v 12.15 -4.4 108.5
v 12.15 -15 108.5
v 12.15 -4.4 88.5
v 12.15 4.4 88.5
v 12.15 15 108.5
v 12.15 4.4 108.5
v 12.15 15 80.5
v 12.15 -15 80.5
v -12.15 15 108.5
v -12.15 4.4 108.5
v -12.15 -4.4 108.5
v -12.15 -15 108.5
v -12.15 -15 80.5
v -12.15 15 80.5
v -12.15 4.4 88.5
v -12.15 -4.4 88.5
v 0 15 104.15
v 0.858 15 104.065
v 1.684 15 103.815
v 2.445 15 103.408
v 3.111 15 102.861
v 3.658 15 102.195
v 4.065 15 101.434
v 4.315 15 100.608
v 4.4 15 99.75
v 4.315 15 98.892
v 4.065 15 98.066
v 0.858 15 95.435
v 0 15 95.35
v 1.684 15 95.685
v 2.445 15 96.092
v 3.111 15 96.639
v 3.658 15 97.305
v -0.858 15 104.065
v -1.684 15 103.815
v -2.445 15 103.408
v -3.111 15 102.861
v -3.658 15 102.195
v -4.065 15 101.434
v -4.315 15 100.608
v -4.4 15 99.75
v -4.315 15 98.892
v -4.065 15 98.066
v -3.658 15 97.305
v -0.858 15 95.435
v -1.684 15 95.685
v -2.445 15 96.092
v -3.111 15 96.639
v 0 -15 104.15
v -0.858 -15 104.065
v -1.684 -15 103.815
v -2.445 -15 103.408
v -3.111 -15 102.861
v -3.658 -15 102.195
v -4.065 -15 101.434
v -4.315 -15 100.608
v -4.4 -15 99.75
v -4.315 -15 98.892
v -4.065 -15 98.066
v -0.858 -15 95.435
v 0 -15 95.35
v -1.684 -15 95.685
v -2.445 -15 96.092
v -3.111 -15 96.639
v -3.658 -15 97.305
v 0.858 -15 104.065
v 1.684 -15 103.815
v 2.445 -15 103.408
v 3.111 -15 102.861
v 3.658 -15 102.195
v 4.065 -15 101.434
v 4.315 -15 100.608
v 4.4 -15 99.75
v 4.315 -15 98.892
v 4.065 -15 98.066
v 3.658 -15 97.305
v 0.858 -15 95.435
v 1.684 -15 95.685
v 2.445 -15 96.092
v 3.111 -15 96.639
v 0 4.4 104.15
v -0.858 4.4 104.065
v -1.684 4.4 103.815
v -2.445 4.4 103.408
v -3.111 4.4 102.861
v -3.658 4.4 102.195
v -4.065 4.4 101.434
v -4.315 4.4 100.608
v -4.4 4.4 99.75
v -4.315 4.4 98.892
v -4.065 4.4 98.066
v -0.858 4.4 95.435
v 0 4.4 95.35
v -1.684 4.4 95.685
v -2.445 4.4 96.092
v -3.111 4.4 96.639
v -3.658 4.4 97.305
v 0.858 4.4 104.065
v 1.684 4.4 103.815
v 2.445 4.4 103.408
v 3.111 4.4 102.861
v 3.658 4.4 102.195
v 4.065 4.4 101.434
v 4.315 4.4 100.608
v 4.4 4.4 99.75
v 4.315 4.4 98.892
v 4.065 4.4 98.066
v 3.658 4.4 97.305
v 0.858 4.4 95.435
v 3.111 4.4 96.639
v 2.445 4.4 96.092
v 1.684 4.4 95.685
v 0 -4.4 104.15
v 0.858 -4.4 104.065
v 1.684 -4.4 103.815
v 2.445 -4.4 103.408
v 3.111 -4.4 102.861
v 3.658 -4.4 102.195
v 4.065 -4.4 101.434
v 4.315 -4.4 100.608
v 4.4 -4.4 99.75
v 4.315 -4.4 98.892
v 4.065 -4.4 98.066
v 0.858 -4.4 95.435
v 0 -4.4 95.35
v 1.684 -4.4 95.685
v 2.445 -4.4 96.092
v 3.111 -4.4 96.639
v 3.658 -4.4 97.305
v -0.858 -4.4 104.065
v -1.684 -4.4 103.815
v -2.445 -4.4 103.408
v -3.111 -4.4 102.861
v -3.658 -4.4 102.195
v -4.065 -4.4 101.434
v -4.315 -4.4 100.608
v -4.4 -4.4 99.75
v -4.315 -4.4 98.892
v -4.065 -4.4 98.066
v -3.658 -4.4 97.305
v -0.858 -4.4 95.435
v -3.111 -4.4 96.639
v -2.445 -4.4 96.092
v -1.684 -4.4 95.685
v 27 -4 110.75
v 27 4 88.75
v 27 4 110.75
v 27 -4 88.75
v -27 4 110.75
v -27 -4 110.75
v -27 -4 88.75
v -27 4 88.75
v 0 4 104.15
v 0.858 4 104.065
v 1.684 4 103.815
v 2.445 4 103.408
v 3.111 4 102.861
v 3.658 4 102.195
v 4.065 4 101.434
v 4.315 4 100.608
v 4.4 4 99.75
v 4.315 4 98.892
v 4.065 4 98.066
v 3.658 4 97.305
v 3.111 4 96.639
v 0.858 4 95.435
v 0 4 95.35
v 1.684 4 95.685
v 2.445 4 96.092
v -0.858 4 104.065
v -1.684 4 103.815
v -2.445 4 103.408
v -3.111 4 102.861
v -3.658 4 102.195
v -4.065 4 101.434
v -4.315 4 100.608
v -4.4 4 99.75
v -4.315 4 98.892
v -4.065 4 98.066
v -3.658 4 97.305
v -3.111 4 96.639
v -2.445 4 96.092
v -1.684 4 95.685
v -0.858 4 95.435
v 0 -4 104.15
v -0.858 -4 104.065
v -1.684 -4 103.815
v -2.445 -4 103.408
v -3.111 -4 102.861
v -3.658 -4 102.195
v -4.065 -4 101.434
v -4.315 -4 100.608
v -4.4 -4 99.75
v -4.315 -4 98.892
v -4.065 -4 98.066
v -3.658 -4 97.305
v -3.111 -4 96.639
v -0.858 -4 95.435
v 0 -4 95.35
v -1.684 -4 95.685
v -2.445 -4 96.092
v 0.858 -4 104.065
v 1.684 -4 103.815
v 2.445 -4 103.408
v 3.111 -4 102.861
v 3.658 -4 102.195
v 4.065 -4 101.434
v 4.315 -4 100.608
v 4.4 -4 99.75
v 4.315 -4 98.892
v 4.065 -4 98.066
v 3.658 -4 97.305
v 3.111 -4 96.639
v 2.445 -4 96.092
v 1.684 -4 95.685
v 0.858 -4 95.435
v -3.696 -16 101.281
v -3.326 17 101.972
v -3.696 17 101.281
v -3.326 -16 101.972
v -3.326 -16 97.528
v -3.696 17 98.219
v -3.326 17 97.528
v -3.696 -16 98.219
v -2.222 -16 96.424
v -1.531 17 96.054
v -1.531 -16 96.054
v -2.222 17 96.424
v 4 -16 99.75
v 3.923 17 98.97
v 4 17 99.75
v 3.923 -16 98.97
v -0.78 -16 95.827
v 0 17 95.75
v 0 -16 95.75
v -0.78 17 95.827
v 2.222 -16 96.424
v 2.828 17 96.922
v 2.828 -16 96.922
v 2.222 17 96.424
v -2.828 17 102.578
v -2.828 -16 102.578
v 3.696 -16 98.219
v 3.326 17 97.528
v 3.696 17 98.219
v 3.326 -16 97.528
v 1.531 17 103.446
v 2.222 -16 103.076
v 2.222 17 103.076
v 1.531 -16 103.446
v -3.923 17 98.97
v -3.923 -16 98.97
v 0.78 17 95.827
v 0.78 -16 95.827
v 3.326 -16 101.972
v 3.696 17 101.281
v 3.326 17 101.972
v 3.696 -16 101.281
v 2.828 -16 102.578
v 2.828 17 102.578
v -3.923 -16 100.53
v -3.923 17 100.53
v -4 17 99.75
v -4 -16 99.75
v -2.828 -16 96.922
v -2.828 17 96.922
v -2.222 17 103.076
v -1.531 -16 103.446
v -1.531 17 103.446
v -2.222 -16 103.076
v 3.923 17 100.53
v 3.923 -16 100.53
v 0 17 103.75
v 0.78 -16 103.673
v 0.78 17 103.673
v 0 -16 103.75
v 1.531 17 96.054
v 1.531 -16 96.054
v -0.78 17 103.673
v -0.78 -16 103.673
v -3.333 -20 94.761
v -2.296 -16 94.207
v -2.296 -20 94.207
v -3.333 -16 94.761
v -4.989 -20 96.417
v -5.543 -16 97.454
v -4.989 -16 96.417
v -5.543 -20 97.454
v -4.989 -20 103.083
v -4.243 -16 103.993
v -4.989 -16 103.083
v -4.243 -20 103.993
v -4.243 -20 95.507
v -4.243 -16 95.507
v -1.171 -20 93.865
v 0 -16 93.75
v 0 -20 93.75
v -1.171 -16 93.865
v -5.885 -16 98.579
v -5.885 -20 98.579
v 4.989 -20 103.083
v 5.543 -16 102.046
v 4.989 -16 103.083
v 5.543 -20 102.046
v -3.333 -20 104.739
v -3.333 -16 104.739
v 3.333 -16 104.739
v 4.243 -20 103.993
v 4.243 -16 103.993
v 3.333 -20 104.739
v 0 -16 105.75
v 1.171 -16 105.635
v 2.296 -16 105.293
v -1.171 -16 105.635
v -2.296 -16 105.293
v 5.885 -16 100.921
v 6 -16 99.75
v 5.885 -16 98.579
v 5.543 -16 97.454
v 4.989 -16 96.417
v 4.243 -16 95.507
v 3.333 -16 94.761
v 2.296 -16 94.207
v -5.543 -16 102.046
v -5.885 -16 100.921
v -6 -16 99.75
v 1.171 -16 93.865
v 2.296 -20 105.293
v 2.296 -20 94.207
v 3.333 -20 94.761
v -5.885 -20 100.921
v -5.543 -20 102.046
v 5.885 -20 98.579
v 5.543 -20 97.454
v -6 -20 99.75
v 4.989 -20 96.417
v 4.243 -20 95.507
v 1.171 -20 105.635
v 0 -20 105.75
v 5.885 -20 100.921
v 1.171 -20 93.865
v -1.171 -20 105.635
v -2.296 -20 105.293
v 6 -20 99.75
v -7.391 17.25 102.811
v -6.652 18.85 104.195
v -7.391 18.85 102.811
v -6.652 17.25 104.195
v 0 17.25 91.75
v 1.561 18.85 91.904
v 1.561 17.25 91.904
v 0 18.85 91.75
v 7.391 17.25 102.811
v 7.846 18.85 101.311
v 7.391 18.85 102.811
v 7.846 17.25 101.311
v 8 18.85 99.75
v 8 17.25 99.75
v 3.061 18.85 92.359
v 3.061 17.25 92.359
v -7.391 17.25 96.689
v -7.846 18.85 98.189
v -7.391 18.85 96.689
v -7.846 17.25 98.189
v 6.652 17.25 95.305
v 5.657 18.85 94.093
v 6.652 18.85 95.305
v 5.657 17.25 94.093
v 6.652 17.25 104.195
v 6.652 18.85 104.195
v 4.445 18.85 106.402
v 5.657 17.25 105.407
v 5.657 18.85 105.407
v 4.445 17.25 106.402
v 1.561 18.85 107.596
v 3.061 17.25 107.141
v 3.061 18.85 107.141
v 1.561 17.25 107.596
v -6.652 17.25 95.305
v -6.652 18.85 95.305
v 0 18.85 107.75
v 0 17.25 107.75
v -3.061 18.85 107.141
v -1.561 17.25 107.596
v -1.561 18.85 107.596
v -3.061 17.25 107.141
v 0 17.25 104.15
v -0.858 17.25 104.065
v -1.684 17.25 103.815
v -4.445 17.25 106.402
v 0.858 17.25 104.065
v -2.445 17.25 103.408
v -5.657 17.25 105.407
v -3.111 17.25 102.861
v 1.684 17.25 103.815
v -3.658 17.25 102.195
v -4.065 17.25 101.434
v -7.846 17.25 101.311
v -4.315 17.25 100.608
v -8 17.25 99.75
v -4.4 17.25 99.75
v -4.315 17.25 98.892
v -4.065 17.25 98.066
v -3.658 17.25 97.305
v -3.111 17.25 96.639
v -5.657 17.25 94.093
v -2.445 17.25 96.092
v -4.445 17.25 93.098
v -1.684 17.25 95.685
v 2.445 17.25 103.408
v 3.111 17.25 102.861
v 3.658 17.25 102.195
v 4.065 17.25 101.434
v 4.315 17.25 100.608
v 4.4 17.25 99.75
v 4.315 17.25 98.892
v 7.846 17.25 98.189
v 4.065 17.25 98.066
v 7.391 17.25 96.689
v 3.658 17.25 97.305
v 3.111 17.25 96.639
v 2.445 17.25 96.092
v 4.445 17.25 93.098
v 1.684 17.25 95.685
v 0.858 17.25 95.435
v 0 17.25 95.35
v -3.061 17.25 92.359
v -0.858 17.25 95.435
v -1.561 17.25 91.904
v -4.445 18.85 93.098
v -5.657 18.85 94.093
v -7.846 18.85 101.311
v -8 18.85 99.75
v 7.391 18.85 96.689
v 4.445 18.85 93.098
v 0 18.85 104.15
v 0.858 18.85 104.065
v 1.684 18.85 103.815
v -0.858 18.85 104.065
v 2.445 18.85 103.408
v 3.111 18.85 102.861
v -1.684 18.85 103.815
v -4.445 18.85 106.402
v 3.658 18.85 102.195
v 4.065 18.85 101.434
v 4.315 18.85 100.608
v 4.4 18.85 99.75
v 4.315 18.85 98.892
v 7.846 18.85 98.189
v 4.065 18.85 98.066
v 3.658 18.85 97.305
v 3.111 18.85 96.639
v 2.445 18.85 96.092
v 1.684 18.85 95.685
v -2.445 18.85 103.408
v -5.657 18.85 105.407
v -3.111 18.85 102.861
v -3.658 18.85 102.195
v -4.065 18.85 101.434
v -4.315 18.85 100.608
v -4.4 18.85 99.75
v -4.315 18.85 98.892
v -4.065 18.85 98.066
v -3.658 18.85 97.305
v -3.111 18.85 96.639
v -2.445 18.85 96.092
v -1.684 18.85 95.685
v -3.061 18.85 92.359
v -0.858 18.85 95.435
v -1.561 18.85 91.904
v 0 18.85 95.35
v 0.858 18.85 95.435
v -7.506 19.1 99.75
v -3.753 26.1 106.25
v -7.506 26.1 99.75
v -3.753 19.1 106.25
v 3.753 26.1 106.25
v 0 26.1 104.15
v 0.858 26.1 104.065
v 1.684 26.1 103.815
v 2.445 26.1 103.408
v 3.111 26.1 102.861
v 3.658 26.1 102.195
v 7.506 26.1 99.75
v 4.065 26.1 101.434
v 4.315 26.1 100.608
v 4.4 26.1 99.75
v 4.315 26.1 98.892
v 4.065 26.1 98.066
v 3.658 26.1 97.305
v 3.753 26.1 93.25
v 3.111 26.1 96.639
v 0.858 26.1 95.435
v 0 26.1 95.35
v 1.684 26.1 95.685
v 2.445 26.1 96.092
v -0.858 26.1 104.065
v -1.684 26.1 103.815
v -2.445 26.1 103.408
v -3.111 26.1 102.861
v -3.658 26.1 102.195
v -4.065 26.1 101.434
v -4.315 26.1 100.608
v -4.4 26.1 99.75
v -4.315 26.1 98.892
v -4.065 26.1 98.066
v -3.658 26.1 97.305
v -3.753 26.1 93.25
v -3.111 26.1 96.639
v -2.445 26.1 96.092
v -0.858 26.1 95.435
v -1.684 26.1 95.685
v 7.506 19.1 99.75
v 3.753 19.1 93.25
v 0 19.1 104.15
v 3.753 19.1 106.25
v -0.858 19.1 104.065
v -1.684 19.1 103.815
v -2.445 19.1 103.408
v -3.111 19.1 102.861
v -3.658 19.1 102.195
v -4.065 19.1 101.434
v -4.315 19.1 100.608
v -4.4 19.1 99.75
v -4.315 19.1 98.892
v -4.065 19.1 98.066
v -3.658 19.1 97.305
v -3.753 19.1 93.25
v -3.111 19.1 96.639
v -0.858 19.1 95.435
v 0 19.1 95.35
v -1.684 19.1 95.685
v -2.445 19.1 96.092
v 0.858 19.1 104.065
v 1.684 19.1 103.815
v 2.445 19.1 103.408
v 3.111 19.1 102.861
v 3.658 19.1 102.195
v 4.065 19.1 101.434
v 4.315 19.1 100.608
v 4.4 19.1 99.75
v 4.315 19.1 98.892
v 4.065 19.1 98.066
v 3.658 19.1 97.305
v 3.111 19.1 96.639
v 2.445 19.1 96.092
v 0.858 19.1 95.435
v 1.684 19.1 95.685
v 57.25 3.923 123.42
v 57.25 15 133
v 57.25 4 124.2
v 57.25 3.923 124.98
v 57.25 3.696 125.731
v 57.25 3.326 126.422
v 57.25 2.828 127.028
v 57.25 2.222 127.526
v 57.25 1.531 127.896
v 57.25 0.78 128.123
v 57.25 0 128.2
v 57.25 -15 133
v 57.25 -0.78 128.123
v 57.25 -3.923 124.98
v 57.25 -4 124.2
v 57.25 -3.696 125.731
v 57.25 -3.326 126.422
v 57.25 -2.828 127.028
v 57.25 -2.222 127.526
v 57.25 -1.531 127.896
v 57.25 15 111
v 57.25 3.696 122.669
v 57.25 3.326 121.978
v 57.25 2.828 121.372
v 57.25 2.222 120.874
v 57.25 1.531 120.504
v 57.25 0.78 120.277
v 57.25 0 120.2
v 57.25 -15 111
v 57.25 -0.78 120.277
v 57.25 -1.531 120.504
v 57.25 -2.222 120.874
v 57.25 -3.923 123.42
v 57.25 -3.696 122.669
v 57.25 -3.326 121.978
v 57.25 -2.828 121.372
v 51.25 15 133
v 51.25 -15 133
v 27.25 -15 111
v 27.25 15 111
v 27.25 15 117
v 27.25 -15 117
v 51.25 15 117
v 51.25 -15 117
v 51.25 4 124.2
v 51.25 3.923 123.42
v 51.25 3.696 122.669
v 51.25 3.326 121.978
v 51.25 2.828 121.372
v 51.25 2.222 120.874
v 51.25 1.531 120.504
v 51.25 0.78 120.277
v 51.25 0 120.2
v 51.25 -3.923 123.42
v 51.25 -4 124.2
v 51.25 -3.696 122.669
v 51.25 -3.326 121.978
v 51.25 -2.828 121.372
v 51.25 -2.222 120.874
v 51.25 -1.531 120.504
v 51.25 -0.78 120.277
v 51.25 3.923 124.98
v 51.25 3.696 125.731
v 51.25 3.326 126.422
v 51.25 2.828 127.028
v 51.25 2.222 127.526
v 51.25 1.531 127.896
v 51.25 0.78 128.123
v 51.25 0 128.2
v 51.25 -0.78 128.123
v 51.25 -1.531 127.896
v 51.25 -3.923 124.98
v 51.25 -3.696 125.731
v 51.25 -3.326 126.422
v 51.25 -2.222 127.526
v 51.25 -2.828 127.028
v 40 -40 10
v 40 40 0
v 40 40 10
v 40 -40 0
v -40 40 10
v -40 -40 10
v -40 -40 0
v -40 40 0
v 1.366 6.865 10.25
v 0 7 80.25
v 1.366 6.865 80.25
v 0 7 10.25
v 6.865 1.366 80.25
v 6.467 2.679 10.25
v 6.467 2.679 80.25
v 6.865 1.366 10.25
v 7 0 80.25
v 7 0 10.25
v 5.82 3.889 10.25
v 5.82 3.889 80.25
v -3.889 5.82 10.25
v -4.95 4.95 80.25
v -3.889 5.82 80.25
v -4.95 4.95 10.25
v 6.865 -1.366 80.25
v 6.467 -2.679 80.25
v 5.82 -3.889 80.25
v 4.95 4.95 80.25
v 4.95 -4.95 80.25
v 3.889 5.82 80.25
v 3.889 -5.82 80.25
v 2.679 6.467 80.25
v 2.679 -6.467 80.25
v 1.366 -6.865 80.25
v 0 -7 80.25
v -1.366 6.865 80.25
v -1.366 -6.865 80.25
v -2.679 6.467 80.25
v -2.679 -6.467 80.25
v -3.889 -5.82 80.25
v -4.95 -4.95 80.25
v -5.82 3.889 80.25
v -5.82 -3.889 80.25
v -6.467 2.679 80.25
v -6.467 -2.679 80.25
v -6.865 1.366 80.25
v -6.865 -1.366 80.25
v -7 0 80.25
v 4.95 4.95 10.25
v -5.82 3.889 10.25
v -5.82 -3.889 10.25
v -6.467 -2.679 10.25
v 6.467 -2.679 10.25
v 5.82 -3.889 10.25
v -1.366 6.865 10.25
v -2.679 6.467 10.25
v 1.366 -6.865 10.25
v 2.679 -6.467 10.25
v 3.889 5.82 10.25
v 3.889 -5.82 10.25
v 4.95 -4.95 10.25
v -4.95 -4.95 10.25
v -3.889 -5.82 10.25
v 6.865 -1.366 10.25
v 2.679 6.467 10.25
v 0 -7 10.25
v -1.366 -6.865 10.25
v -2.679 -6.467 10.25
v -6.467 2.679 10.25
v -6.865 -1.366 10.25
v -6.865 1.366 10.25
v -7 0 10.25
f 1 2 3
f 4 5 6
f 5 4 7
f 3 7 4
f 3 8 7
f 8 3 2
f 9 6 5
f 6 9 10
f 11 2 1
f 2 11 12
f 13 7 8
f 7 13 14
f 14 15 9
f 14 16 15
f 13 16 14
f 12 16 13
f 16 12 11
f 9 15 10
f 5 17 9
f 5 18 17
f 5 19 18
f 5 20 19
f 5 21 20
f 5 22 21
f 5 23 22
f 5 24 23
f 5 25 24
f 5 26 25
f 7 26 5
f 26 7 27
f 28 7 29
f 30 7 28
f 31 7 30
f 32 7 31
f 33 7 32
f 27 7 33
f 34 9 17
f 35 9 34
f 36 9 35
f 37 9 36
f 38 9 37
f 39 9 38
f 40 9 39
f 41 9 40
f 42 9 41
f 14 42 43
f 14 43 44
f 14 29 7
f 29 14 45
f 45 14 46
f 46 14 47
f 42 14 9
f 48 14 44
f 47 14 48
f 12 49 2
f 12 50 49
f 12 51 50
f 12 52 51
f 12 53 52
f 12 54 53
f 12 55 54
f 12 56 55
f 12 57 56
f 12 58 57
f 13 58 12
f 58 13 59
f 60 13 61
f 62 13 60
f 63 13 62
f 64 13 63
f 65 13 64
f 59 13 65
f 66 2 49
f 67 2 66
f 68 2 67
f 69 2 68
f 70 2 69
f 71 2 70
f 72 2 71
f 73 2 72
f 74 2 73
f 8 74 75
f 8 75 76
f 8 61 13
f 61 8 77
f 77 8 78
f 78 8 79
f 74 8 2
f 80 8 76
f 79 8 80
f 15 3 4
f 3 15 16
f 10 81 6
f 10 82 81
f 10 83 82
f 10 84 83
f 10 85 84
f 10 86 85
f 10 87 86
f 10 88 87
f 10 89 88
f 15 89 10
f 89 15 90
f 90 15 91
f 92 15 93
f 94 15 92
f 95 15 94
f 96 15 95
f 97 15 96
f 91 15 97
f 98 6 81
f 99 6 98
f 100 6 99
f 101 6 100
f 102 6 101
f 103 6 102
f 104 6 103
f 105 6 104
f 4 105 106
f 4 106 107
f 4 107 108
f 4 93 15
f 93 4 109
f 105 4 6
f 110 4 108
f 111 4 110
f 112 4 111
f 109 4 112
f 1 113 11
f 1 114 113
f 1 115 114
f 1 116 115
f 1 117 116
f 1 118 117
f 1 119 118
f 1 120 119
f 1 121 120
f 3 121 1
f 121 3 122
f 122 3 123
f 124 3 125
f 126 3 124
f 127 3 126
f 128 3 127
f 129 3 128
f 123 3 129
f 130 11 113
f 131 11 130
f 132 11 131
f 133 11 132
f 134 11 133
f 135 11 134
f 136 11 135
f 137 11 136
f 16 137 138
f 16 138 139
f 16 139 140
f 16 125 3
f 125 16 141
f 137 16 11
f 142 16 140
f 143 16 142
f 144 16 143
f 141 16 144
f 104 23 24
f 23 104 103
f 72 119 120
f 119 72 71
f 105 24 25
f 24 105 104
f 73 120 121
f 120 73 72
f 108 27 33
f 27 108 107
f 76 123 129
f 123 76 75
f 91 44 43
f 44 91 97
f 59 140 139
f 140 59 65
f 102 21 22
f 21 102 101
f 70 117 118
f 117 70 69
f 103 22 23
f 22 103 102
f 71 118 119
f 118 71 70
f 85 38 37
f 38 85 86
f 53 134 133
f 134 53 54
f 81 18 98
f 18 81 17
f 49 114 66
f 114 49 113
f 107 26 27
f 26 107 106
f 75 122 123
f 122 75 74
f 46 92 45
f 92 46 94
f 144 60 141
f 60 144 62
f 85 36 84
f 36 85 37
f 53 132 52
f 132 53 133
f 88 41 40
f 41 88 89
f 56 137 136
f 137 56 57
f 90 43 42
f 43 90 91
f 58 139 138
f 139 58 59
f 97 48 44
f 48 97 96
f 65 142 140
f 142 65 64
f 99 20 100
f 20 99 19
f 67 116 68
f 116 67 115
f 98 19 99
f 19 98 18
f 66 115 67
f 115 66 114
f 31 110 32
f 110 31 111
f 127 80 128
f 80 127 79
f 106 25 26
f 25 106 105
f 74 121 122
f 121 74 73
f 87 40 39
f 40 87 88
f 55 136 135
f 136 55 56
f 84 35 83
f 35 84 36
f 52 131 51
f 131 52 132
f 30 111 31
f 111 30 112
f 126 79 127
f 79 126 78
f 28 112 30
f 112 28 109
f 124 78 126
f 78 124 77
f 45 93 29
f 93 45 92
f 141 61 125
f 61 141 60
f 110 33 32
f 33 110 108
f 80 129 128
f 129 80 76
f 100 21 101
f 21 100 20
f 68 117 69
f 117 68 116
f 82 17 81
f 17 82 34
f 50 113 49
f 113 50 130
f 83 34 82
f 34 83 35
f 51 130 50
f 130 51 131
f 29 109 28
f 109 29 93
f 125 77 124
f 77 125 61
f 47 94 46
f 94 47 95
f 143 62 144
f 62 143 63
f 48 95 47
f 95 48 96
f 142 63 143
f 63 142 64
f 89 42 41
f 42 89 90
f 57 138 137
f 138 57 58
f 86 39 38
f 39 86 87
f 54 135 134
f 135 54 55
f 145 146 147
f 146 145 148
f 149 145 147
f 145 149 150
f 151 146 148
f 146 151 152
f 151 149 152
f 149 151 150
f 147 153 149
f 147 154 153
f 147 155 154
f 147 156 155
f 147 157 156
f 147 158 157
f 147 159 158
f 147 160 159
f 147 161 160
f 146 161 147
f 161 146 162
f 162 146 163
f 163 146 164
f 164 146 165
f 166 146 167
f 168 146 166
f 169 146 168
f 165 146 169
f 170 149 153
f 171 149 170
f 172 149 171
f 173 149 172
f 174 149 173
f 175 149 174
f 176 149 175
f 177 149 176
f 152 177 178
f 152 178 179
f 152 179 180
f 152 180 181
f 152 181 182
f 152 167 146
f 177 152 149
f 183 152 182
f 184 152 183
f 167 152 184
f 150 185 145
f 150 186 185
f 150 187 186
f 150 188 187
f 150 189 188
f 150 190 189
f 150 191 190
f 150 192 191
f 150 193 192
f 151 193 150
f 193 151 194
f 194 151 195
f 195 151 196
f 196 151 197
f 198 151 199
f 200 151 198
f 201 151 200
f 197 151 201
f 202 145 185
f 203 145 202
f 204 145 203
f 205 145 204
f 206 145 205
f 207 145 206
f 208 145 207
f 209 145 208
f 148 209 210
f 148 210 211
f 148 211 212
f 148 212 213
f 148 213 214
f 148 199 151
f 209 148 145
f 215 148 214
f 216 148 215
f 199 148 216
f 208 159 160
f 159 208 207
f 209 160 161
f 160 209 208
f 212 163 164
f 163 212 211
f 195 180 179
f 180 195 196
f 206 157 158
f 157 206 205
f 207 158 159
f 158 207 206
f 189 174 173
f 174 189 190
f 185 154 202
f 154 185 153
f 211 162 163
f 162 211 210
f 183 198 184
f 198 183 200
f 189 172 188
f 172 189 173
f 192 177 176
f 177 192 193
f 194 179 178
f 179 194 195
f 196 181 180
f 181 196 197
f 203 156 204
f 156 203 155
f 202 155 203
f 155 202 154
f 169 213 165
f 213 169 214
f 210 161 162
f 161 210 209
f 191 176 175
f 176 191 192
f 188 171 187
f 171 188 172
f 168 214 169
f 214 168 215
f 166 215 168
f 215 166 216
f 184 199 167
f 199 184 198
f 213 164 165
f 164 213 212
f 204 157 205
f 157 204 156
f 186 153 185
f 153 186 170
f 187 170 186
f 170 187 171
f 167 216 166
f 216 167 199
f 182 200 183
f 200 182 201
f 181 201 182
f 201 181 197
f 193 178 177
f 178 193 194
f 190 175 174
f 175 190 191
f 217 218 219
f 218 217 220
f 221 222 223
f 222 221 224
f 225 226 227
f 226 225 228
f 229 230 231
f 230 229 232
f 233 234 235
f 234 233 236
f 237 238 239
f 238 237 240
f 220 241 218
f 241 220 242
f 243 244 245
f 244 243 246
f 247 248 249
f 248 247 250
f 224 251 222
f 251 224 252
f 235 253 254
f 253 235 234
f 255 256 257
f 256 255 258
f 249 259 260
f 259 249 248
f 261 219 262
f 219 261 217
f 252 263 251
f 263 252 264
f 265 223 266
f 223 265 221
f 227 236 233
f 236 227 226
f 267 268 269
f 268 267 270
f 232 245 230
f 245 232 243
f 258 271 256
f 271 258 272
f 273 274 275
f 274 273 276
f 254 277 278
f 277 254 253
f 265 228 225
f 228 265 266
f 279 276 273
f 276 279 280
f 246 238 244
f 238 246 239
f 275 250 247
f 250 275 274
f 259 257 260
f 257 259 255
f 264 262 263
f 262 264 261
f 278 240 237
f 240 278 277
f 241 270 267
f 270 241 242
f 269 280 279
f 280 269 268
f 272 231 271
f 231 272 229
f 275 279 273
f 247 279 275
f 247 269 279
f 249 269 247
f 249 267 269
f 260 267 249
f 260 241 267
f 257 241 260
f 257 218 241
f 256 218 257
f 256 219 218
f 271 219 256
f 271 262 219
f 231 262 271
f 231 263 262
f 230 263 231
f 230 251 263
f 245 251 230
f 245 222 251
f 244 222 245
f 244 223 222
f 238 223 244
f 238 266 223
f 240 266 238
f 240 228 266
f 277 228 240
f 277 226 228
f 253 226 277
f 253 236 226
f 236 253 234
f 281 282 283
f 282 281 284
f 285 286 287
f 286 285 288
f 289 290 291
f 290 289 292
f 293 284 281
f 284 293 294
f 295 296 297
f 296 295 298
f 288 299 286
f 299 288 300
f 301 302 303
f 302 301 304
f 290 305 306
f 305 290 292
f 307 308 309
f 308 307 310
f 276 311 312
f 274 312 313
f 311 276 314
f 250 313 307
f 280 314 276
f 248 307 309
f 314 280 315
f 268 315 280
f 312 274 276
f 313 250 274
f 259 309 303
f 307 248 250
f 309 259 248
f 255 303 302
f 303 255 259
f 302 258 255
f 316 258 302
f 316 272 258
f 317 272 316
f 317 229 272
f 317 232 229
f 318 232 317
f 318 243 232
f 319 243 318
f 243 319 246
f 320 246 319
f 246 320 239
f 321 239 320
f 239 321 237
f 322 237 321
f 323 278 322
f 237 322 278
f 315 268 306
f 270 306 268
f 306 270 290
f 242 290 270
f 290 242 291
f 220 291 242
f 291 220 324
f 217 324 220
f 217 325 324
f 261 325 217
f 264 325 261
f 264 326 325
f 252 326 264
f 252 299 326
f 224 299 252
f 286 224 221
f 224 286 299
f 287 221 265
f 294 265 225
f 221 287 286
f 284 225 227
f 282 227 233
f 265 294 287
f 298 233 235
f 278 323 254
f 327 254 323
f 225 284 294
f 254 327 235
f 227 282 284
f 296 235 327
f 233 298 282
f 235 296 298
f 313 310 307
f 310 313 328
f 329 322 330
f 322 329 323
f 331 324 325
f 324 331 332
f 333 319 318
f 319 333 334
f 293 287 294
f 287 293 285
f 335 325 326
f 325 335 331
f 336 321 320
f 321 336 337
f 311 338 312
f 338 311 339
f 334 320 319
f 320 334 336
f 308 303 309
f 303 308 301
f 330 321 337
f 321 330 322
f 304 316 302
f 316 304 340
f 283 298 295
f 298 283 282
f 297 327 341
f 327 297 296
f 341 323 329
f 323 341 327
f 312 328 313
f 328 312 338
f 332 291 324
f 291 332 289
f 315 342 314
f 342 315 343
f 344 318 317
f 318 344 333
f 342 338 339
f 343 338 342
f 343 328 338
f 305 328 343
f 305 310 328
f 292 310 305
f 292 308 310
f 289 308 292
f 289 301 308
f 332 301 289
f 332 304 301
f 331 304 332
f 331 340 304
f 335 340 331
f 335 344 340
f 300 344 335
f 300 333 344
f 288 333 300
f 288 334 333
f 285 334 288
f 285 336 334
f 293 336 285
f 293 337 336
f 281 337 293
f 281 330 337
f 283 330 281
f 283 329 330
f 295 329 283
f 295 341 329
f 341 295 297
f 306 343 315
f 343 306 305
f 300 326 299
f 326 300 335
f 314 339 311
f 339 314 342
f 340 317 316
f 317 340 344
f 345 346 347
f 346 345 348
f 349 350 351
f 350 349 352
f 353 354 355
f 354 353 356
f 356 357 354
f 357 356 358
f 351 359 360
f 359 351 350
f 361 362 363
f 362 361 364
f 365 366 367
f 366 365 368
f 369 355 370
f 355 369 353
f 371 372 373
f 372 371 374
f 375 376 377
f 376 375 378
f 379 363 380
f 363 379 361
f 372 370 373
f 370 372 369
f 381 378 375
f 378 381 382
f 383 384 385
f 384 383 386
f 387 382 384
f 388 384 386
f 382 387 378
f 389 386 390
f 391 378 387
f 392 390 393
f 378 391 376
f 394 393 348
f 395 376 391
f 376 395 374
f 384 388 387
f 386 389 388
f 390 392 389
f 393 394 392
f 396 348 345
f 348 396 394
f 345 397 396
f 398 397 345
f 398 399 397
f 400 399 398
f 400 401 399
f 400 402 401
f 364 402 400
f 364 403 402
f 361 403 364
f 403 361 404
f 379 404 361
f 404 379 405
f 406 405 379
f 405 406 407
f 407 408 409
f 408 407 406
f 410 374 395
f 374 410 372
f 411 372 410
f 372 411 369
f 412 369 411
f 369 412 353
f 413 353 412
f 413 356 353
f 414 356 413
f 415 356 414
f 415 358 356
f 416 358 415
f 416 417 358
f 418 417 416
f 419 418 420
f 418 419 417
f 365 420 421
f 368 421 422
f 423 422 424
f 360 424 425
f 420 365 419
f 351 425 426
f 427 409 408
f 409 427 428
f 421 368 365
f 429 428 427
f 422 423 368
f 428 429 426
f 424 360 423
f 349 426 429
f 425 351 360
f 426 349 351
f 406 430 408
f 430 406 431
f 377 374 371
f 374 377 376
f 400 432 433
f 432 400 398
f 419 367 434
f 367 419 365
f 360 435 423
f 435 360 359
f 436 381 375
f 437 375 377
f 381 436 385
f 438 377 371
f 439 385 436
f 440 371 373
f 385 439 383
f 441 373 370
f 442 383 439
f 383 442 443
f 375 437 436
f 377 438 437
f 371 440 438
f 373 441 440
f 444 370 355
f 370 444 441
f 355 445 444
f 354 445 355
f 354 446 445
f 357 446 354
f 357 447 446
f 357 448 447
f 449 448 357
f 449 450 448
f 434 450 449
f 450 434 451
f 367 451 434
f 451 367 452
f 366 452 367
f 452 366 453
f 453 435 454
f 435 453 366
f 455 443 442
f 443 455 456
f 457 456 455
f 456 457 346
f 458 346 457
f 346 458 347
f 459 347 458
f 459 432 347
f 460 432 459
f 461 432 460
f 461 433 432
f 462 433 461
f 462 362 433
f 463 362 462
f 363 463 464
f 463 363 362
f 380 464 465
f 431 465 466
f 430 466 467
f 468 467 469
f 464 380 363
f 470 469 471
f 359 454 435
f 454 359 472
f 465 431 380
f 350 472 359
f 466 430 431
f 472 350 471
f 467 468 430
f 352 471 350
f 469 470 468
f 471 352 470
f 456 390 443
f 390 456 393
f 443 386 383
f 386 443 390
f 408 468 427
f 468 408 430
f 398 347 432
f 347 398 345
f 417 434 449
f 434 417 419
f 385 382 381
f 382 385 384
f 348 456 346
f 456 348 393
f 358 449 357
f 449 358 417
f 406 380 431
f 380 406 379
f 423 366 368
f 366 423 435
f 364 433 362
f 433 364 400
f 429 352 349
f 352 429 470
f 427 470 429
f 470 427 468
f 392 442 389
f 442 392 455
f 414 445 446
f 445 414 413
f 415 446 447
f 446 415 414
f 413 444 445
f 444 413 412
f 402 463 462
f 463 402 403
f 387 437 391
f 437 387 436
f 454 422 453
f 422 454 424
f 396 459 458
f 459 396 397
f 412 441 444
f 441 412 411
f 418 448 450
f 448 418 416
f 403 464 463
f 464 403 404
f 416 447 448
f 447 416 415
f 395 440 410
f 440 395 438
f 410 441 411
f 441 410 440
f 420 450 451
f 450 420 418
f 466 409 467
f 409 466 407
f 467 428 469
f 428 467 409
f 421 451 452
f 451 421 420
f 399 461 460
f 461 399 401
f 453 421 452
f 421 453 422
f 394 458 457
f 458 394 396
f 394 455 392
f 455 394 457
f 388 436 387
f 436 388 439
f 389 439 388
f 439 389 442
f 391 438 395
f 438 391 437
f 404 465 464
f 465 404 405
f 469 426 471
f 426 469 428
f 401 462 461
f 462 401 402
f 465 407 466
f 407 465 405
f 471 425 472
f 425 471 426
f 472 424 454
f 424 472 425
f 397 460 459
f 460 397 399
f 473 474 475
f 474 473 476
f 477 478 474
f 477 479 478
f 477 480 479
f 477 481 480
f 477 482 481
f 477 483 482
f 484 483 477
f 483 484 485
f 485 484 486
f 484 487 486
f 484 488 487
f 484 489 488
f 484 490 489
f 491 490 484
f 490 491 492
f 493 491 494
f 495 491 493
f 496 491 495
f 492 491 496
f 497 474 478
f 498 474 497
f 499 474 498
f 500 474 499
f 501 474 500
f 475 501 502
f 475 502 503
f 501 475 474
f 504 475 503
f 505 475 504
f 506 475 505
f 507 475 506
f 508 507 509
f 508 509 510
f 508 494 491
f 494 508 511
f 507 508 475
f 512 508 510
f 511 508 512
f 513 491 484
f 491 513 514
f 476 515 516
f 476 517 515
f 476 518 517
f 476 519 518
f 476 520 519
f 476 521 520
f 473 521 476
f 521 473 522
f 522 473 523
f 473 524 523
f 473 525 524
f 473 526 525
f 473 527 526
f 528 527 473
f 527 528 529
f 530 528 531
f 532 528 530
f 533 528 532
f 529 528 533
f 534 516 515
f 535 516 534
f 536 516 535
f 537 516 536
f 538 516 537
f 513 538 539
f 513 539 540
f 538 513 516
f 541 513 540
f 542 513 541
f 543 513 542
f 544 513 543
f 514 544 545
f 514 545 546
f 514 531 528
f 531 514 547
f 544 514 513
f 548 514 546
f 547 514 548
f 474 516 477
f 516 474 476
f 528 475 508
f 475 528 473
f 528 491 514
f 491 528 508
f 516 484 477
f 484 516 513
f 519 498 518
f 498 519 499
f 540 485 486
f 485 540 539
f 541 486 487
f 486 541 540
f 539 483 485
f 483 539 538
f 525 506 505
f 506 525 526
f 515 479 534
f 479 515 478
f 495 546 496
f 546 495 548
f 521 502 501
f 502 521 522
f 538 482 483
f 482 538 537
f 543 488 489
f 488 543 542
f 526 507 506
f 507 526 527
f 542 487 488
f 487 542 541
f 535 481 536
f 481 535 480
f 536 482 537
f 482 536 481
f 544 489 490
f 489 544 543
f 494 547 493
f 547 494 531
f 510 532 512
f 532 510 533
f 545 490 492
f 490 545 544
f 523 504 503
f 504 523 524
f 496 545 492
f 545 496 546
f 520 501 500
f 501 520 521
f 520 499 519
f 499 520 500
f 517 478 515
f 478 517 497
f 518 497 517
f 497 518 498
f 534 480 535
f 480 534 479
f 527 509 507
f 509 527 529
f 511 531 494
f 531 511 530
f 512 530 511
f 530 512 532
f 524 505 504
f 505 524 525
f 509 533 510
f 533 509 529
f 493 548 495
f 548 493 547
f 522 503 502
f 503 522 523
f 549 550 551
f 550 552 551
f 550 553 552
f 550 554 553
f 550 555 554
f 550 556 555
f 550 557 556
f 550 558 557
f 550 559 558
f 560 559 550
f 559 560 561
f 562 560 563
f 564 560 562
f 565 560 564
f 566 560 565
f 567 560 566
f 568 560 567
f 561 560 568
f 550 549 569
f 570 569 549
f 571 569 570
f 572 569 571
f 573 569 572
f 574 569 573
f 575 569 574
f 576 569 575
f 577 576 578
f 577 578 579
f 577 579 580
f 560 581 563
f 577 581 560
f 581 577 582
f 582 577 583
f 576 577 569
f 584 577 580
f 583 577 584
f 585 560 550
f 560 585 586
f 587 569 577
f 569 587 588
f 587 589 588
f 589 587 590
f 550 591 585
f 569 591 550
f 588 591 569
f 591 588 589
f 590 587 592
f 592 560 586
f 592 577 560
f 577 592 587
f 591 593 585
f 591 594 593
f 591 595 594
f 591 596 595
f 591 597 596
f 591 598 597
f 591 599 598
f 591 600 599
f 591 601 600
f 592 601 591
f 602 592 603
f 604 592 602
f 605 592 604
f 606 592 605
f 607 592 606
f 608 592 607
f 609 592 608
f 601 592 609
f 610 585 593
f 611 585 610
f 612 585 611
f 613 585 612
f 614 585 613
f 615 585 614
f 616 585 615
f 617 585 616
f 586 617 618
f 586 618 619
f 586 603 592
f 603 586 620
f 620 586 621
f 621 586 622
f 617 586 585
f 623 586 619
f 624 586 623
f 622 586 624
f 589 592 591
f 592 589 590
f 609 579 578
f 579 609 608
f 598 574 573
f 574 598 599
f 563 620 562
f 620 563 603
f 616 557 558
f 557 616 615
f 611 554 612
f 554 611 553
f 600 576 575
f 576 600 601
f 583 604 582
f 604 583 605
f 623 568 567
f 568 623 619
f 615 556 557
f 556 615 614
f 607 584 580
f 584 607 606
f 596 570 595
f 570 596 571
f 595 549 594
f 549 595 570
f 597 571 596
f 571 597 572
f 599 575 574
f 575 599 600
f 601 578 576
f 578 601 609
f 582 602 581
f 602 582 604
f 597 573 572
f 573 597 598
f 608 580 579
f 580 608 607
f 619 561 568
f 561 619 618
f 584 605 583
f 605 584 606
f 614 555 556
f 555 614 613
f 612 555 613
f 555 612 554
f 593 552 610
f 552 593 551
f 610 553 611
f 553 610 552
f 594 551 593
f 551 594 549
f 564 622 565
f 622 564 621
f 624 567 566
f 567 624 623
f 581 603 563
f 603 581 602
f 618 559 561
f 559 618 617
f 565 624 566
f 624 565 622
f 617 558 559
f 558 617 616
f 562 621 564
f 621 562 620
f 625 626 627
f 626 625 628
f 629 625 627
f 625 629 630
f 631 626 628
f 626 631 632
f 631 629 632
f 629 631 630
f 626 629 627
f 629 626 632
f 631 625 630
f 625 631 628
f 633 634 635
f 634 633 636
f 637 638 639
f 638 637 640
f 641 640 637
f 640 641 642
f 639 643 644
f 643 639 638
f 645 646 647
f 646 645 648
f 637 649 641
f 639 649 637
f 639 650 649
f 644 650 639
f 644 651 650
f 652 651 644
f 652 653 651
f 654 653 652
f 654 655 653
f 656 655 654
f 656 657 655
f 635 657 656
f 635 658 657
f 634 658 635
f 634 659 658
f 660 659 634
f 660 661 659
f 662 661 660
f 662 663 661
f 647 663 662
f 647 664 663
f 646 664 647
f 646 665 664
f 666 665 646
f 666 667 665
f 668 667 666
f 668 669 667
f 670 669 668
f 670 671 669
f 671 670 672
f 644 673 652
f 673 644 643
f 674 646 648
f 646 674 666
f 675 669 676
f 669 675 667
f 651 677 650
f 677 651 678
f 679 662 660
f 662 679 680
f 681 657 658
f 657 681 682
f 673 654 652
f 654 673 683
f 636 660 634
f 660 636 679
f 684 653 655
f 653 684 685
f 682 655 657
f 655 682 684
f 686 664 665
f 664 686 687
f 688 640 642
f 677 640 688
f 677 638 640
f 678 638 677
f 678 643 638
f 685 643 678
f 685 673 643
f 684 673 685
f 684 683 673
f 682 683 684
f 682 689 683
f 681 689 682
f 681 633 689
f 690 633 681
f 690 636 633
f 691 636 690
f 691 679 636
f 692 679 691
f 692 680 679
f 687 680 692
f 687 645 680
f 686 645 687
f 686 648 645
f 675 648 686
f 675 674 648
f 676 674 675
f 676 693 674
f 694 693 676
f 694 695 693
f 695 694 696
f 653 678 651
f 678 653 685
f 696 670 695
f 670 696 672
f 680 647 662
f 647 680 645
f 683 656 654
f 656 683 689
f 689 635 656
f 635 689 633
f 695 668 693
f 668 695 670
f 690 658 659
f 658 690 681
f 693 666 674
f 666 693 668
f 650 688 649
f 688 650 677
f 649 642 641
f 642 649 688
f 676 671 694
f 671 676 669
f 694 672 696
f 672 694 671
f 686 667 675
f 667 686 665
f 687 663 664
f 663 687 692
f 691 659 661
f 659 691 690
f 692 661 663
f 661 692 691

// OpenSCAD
$fn = 32;

// ------------------------------------------------------------------------
// Lamp arm: column d14 x 70 mm, arm 54 mm
// Every part is its own module, assembly() places every instance.
// ------------------------------------------------------------------------

// --- part 1 ---
module lamp_base() {
  difference() {
    translate([-40, -40, 0]) cube([80, 80, 10]);
  }
}

// --- part 2 ---
module lamp_column() {
  cylinder(h = 70, d = 14);
}

// --- part 3 ---
module head_fork() {
  difference() {
    translate([-12.15, -15, 0]) cube([24.3, 30, 28]);
    translate([-13.15, -4.4, 8]) cube([26.3, 8.8, 21]);
    translate([0, 0, 19.25]) rotate([90, 0, 0]) cylinder(h = 32, d = 8.8, center = true);
  }
}

// --- part 4 ---
module lamp_arm() {
  difference() {
    translate([-27, -4, 0]) cube([54, 8, 22]);
    translate([0, 0, 11]) rotate([90, 0, 0]) cylinder(h = 10, d = 8.8, center = true);
  }
}

// --- part 5 ---
module arm_pin() {
  rotate([0, 90, 0]) cylinder(h = 34, d = 8, center = true);
  translate([-20, 0, 0]) rotate([0, 90, 0]) cylinder(h = 4, d = 12);
}

// --- part 6 ---
module arm_washer() {
  difference() {
      translate([0, 0, 0]) cylinder(h = 1.6, d = 16);
      translate([0, 0, -1]) cylinder(h = 3.6, d = 8.8);
    }
}

// --- part 7 ---
module arm_nut() {
  difference() {
    linear_extrude(height = 7) polygon(points = [[7.506, 0], [3.753, 6.5], [-3.753, 6.5], [-7.506, 0], [-3.753, -6.5], [3.753, -6.5]]);
    translate([0, 0, -1]) cylinder(h = 9, d = 8.8);
  }
}

// --- part 8 ---
module shade_bracket() {
  difference() {
    translate([-15, -15, 0]) cube([30, 30, 22]);
    translate([-16, -16, 6]) cube([25, 32, 17]);
    translate([12, 0, 13.2]) rotate([0, 90, 0]) cylinder(h = 8, d = 8, center = true);
  }
}

// --- assembly ---
module assembly() {
  color([0.80, 0.24, 0.20]) translate([0, 0, 0]) rotate([0, 0, 0]) lamp_base();
  color([0.20, 0.45, 0.75]) translate([0, 0, 10.25]) rotate([0, 0, 0]) lamp_column();
  color([0.25, 0.62, 0.32]) translate([0, 0, 80.5]) rotate([0, 0, 0]) head_fork();
  color([0.92, 0.70, 0.18]) translate([0, 0, 88.75]) rotate([0, 0, 0]) lamp_arm();
  color([0.58, 0.35, 0.70]) translate([0, 0, 99.75]) rotate([0, 0, 90]) arm_pin();
  color([0.16, 0.66, 0.66]) translate([0, 18.85, 99.75]) rotate([90, 0, 0]) arm_washer();
  color([0.85, 0.48, 0.18]) translate([0, 26.1, 99.75]) rotate([90, 0, 0]) arm_nut();
  color([0.55, 0.60, 0.65]) translate([42.25, 0, 111]) rotate([0, 0, 0]) shade_bracket();
}

assembly();
